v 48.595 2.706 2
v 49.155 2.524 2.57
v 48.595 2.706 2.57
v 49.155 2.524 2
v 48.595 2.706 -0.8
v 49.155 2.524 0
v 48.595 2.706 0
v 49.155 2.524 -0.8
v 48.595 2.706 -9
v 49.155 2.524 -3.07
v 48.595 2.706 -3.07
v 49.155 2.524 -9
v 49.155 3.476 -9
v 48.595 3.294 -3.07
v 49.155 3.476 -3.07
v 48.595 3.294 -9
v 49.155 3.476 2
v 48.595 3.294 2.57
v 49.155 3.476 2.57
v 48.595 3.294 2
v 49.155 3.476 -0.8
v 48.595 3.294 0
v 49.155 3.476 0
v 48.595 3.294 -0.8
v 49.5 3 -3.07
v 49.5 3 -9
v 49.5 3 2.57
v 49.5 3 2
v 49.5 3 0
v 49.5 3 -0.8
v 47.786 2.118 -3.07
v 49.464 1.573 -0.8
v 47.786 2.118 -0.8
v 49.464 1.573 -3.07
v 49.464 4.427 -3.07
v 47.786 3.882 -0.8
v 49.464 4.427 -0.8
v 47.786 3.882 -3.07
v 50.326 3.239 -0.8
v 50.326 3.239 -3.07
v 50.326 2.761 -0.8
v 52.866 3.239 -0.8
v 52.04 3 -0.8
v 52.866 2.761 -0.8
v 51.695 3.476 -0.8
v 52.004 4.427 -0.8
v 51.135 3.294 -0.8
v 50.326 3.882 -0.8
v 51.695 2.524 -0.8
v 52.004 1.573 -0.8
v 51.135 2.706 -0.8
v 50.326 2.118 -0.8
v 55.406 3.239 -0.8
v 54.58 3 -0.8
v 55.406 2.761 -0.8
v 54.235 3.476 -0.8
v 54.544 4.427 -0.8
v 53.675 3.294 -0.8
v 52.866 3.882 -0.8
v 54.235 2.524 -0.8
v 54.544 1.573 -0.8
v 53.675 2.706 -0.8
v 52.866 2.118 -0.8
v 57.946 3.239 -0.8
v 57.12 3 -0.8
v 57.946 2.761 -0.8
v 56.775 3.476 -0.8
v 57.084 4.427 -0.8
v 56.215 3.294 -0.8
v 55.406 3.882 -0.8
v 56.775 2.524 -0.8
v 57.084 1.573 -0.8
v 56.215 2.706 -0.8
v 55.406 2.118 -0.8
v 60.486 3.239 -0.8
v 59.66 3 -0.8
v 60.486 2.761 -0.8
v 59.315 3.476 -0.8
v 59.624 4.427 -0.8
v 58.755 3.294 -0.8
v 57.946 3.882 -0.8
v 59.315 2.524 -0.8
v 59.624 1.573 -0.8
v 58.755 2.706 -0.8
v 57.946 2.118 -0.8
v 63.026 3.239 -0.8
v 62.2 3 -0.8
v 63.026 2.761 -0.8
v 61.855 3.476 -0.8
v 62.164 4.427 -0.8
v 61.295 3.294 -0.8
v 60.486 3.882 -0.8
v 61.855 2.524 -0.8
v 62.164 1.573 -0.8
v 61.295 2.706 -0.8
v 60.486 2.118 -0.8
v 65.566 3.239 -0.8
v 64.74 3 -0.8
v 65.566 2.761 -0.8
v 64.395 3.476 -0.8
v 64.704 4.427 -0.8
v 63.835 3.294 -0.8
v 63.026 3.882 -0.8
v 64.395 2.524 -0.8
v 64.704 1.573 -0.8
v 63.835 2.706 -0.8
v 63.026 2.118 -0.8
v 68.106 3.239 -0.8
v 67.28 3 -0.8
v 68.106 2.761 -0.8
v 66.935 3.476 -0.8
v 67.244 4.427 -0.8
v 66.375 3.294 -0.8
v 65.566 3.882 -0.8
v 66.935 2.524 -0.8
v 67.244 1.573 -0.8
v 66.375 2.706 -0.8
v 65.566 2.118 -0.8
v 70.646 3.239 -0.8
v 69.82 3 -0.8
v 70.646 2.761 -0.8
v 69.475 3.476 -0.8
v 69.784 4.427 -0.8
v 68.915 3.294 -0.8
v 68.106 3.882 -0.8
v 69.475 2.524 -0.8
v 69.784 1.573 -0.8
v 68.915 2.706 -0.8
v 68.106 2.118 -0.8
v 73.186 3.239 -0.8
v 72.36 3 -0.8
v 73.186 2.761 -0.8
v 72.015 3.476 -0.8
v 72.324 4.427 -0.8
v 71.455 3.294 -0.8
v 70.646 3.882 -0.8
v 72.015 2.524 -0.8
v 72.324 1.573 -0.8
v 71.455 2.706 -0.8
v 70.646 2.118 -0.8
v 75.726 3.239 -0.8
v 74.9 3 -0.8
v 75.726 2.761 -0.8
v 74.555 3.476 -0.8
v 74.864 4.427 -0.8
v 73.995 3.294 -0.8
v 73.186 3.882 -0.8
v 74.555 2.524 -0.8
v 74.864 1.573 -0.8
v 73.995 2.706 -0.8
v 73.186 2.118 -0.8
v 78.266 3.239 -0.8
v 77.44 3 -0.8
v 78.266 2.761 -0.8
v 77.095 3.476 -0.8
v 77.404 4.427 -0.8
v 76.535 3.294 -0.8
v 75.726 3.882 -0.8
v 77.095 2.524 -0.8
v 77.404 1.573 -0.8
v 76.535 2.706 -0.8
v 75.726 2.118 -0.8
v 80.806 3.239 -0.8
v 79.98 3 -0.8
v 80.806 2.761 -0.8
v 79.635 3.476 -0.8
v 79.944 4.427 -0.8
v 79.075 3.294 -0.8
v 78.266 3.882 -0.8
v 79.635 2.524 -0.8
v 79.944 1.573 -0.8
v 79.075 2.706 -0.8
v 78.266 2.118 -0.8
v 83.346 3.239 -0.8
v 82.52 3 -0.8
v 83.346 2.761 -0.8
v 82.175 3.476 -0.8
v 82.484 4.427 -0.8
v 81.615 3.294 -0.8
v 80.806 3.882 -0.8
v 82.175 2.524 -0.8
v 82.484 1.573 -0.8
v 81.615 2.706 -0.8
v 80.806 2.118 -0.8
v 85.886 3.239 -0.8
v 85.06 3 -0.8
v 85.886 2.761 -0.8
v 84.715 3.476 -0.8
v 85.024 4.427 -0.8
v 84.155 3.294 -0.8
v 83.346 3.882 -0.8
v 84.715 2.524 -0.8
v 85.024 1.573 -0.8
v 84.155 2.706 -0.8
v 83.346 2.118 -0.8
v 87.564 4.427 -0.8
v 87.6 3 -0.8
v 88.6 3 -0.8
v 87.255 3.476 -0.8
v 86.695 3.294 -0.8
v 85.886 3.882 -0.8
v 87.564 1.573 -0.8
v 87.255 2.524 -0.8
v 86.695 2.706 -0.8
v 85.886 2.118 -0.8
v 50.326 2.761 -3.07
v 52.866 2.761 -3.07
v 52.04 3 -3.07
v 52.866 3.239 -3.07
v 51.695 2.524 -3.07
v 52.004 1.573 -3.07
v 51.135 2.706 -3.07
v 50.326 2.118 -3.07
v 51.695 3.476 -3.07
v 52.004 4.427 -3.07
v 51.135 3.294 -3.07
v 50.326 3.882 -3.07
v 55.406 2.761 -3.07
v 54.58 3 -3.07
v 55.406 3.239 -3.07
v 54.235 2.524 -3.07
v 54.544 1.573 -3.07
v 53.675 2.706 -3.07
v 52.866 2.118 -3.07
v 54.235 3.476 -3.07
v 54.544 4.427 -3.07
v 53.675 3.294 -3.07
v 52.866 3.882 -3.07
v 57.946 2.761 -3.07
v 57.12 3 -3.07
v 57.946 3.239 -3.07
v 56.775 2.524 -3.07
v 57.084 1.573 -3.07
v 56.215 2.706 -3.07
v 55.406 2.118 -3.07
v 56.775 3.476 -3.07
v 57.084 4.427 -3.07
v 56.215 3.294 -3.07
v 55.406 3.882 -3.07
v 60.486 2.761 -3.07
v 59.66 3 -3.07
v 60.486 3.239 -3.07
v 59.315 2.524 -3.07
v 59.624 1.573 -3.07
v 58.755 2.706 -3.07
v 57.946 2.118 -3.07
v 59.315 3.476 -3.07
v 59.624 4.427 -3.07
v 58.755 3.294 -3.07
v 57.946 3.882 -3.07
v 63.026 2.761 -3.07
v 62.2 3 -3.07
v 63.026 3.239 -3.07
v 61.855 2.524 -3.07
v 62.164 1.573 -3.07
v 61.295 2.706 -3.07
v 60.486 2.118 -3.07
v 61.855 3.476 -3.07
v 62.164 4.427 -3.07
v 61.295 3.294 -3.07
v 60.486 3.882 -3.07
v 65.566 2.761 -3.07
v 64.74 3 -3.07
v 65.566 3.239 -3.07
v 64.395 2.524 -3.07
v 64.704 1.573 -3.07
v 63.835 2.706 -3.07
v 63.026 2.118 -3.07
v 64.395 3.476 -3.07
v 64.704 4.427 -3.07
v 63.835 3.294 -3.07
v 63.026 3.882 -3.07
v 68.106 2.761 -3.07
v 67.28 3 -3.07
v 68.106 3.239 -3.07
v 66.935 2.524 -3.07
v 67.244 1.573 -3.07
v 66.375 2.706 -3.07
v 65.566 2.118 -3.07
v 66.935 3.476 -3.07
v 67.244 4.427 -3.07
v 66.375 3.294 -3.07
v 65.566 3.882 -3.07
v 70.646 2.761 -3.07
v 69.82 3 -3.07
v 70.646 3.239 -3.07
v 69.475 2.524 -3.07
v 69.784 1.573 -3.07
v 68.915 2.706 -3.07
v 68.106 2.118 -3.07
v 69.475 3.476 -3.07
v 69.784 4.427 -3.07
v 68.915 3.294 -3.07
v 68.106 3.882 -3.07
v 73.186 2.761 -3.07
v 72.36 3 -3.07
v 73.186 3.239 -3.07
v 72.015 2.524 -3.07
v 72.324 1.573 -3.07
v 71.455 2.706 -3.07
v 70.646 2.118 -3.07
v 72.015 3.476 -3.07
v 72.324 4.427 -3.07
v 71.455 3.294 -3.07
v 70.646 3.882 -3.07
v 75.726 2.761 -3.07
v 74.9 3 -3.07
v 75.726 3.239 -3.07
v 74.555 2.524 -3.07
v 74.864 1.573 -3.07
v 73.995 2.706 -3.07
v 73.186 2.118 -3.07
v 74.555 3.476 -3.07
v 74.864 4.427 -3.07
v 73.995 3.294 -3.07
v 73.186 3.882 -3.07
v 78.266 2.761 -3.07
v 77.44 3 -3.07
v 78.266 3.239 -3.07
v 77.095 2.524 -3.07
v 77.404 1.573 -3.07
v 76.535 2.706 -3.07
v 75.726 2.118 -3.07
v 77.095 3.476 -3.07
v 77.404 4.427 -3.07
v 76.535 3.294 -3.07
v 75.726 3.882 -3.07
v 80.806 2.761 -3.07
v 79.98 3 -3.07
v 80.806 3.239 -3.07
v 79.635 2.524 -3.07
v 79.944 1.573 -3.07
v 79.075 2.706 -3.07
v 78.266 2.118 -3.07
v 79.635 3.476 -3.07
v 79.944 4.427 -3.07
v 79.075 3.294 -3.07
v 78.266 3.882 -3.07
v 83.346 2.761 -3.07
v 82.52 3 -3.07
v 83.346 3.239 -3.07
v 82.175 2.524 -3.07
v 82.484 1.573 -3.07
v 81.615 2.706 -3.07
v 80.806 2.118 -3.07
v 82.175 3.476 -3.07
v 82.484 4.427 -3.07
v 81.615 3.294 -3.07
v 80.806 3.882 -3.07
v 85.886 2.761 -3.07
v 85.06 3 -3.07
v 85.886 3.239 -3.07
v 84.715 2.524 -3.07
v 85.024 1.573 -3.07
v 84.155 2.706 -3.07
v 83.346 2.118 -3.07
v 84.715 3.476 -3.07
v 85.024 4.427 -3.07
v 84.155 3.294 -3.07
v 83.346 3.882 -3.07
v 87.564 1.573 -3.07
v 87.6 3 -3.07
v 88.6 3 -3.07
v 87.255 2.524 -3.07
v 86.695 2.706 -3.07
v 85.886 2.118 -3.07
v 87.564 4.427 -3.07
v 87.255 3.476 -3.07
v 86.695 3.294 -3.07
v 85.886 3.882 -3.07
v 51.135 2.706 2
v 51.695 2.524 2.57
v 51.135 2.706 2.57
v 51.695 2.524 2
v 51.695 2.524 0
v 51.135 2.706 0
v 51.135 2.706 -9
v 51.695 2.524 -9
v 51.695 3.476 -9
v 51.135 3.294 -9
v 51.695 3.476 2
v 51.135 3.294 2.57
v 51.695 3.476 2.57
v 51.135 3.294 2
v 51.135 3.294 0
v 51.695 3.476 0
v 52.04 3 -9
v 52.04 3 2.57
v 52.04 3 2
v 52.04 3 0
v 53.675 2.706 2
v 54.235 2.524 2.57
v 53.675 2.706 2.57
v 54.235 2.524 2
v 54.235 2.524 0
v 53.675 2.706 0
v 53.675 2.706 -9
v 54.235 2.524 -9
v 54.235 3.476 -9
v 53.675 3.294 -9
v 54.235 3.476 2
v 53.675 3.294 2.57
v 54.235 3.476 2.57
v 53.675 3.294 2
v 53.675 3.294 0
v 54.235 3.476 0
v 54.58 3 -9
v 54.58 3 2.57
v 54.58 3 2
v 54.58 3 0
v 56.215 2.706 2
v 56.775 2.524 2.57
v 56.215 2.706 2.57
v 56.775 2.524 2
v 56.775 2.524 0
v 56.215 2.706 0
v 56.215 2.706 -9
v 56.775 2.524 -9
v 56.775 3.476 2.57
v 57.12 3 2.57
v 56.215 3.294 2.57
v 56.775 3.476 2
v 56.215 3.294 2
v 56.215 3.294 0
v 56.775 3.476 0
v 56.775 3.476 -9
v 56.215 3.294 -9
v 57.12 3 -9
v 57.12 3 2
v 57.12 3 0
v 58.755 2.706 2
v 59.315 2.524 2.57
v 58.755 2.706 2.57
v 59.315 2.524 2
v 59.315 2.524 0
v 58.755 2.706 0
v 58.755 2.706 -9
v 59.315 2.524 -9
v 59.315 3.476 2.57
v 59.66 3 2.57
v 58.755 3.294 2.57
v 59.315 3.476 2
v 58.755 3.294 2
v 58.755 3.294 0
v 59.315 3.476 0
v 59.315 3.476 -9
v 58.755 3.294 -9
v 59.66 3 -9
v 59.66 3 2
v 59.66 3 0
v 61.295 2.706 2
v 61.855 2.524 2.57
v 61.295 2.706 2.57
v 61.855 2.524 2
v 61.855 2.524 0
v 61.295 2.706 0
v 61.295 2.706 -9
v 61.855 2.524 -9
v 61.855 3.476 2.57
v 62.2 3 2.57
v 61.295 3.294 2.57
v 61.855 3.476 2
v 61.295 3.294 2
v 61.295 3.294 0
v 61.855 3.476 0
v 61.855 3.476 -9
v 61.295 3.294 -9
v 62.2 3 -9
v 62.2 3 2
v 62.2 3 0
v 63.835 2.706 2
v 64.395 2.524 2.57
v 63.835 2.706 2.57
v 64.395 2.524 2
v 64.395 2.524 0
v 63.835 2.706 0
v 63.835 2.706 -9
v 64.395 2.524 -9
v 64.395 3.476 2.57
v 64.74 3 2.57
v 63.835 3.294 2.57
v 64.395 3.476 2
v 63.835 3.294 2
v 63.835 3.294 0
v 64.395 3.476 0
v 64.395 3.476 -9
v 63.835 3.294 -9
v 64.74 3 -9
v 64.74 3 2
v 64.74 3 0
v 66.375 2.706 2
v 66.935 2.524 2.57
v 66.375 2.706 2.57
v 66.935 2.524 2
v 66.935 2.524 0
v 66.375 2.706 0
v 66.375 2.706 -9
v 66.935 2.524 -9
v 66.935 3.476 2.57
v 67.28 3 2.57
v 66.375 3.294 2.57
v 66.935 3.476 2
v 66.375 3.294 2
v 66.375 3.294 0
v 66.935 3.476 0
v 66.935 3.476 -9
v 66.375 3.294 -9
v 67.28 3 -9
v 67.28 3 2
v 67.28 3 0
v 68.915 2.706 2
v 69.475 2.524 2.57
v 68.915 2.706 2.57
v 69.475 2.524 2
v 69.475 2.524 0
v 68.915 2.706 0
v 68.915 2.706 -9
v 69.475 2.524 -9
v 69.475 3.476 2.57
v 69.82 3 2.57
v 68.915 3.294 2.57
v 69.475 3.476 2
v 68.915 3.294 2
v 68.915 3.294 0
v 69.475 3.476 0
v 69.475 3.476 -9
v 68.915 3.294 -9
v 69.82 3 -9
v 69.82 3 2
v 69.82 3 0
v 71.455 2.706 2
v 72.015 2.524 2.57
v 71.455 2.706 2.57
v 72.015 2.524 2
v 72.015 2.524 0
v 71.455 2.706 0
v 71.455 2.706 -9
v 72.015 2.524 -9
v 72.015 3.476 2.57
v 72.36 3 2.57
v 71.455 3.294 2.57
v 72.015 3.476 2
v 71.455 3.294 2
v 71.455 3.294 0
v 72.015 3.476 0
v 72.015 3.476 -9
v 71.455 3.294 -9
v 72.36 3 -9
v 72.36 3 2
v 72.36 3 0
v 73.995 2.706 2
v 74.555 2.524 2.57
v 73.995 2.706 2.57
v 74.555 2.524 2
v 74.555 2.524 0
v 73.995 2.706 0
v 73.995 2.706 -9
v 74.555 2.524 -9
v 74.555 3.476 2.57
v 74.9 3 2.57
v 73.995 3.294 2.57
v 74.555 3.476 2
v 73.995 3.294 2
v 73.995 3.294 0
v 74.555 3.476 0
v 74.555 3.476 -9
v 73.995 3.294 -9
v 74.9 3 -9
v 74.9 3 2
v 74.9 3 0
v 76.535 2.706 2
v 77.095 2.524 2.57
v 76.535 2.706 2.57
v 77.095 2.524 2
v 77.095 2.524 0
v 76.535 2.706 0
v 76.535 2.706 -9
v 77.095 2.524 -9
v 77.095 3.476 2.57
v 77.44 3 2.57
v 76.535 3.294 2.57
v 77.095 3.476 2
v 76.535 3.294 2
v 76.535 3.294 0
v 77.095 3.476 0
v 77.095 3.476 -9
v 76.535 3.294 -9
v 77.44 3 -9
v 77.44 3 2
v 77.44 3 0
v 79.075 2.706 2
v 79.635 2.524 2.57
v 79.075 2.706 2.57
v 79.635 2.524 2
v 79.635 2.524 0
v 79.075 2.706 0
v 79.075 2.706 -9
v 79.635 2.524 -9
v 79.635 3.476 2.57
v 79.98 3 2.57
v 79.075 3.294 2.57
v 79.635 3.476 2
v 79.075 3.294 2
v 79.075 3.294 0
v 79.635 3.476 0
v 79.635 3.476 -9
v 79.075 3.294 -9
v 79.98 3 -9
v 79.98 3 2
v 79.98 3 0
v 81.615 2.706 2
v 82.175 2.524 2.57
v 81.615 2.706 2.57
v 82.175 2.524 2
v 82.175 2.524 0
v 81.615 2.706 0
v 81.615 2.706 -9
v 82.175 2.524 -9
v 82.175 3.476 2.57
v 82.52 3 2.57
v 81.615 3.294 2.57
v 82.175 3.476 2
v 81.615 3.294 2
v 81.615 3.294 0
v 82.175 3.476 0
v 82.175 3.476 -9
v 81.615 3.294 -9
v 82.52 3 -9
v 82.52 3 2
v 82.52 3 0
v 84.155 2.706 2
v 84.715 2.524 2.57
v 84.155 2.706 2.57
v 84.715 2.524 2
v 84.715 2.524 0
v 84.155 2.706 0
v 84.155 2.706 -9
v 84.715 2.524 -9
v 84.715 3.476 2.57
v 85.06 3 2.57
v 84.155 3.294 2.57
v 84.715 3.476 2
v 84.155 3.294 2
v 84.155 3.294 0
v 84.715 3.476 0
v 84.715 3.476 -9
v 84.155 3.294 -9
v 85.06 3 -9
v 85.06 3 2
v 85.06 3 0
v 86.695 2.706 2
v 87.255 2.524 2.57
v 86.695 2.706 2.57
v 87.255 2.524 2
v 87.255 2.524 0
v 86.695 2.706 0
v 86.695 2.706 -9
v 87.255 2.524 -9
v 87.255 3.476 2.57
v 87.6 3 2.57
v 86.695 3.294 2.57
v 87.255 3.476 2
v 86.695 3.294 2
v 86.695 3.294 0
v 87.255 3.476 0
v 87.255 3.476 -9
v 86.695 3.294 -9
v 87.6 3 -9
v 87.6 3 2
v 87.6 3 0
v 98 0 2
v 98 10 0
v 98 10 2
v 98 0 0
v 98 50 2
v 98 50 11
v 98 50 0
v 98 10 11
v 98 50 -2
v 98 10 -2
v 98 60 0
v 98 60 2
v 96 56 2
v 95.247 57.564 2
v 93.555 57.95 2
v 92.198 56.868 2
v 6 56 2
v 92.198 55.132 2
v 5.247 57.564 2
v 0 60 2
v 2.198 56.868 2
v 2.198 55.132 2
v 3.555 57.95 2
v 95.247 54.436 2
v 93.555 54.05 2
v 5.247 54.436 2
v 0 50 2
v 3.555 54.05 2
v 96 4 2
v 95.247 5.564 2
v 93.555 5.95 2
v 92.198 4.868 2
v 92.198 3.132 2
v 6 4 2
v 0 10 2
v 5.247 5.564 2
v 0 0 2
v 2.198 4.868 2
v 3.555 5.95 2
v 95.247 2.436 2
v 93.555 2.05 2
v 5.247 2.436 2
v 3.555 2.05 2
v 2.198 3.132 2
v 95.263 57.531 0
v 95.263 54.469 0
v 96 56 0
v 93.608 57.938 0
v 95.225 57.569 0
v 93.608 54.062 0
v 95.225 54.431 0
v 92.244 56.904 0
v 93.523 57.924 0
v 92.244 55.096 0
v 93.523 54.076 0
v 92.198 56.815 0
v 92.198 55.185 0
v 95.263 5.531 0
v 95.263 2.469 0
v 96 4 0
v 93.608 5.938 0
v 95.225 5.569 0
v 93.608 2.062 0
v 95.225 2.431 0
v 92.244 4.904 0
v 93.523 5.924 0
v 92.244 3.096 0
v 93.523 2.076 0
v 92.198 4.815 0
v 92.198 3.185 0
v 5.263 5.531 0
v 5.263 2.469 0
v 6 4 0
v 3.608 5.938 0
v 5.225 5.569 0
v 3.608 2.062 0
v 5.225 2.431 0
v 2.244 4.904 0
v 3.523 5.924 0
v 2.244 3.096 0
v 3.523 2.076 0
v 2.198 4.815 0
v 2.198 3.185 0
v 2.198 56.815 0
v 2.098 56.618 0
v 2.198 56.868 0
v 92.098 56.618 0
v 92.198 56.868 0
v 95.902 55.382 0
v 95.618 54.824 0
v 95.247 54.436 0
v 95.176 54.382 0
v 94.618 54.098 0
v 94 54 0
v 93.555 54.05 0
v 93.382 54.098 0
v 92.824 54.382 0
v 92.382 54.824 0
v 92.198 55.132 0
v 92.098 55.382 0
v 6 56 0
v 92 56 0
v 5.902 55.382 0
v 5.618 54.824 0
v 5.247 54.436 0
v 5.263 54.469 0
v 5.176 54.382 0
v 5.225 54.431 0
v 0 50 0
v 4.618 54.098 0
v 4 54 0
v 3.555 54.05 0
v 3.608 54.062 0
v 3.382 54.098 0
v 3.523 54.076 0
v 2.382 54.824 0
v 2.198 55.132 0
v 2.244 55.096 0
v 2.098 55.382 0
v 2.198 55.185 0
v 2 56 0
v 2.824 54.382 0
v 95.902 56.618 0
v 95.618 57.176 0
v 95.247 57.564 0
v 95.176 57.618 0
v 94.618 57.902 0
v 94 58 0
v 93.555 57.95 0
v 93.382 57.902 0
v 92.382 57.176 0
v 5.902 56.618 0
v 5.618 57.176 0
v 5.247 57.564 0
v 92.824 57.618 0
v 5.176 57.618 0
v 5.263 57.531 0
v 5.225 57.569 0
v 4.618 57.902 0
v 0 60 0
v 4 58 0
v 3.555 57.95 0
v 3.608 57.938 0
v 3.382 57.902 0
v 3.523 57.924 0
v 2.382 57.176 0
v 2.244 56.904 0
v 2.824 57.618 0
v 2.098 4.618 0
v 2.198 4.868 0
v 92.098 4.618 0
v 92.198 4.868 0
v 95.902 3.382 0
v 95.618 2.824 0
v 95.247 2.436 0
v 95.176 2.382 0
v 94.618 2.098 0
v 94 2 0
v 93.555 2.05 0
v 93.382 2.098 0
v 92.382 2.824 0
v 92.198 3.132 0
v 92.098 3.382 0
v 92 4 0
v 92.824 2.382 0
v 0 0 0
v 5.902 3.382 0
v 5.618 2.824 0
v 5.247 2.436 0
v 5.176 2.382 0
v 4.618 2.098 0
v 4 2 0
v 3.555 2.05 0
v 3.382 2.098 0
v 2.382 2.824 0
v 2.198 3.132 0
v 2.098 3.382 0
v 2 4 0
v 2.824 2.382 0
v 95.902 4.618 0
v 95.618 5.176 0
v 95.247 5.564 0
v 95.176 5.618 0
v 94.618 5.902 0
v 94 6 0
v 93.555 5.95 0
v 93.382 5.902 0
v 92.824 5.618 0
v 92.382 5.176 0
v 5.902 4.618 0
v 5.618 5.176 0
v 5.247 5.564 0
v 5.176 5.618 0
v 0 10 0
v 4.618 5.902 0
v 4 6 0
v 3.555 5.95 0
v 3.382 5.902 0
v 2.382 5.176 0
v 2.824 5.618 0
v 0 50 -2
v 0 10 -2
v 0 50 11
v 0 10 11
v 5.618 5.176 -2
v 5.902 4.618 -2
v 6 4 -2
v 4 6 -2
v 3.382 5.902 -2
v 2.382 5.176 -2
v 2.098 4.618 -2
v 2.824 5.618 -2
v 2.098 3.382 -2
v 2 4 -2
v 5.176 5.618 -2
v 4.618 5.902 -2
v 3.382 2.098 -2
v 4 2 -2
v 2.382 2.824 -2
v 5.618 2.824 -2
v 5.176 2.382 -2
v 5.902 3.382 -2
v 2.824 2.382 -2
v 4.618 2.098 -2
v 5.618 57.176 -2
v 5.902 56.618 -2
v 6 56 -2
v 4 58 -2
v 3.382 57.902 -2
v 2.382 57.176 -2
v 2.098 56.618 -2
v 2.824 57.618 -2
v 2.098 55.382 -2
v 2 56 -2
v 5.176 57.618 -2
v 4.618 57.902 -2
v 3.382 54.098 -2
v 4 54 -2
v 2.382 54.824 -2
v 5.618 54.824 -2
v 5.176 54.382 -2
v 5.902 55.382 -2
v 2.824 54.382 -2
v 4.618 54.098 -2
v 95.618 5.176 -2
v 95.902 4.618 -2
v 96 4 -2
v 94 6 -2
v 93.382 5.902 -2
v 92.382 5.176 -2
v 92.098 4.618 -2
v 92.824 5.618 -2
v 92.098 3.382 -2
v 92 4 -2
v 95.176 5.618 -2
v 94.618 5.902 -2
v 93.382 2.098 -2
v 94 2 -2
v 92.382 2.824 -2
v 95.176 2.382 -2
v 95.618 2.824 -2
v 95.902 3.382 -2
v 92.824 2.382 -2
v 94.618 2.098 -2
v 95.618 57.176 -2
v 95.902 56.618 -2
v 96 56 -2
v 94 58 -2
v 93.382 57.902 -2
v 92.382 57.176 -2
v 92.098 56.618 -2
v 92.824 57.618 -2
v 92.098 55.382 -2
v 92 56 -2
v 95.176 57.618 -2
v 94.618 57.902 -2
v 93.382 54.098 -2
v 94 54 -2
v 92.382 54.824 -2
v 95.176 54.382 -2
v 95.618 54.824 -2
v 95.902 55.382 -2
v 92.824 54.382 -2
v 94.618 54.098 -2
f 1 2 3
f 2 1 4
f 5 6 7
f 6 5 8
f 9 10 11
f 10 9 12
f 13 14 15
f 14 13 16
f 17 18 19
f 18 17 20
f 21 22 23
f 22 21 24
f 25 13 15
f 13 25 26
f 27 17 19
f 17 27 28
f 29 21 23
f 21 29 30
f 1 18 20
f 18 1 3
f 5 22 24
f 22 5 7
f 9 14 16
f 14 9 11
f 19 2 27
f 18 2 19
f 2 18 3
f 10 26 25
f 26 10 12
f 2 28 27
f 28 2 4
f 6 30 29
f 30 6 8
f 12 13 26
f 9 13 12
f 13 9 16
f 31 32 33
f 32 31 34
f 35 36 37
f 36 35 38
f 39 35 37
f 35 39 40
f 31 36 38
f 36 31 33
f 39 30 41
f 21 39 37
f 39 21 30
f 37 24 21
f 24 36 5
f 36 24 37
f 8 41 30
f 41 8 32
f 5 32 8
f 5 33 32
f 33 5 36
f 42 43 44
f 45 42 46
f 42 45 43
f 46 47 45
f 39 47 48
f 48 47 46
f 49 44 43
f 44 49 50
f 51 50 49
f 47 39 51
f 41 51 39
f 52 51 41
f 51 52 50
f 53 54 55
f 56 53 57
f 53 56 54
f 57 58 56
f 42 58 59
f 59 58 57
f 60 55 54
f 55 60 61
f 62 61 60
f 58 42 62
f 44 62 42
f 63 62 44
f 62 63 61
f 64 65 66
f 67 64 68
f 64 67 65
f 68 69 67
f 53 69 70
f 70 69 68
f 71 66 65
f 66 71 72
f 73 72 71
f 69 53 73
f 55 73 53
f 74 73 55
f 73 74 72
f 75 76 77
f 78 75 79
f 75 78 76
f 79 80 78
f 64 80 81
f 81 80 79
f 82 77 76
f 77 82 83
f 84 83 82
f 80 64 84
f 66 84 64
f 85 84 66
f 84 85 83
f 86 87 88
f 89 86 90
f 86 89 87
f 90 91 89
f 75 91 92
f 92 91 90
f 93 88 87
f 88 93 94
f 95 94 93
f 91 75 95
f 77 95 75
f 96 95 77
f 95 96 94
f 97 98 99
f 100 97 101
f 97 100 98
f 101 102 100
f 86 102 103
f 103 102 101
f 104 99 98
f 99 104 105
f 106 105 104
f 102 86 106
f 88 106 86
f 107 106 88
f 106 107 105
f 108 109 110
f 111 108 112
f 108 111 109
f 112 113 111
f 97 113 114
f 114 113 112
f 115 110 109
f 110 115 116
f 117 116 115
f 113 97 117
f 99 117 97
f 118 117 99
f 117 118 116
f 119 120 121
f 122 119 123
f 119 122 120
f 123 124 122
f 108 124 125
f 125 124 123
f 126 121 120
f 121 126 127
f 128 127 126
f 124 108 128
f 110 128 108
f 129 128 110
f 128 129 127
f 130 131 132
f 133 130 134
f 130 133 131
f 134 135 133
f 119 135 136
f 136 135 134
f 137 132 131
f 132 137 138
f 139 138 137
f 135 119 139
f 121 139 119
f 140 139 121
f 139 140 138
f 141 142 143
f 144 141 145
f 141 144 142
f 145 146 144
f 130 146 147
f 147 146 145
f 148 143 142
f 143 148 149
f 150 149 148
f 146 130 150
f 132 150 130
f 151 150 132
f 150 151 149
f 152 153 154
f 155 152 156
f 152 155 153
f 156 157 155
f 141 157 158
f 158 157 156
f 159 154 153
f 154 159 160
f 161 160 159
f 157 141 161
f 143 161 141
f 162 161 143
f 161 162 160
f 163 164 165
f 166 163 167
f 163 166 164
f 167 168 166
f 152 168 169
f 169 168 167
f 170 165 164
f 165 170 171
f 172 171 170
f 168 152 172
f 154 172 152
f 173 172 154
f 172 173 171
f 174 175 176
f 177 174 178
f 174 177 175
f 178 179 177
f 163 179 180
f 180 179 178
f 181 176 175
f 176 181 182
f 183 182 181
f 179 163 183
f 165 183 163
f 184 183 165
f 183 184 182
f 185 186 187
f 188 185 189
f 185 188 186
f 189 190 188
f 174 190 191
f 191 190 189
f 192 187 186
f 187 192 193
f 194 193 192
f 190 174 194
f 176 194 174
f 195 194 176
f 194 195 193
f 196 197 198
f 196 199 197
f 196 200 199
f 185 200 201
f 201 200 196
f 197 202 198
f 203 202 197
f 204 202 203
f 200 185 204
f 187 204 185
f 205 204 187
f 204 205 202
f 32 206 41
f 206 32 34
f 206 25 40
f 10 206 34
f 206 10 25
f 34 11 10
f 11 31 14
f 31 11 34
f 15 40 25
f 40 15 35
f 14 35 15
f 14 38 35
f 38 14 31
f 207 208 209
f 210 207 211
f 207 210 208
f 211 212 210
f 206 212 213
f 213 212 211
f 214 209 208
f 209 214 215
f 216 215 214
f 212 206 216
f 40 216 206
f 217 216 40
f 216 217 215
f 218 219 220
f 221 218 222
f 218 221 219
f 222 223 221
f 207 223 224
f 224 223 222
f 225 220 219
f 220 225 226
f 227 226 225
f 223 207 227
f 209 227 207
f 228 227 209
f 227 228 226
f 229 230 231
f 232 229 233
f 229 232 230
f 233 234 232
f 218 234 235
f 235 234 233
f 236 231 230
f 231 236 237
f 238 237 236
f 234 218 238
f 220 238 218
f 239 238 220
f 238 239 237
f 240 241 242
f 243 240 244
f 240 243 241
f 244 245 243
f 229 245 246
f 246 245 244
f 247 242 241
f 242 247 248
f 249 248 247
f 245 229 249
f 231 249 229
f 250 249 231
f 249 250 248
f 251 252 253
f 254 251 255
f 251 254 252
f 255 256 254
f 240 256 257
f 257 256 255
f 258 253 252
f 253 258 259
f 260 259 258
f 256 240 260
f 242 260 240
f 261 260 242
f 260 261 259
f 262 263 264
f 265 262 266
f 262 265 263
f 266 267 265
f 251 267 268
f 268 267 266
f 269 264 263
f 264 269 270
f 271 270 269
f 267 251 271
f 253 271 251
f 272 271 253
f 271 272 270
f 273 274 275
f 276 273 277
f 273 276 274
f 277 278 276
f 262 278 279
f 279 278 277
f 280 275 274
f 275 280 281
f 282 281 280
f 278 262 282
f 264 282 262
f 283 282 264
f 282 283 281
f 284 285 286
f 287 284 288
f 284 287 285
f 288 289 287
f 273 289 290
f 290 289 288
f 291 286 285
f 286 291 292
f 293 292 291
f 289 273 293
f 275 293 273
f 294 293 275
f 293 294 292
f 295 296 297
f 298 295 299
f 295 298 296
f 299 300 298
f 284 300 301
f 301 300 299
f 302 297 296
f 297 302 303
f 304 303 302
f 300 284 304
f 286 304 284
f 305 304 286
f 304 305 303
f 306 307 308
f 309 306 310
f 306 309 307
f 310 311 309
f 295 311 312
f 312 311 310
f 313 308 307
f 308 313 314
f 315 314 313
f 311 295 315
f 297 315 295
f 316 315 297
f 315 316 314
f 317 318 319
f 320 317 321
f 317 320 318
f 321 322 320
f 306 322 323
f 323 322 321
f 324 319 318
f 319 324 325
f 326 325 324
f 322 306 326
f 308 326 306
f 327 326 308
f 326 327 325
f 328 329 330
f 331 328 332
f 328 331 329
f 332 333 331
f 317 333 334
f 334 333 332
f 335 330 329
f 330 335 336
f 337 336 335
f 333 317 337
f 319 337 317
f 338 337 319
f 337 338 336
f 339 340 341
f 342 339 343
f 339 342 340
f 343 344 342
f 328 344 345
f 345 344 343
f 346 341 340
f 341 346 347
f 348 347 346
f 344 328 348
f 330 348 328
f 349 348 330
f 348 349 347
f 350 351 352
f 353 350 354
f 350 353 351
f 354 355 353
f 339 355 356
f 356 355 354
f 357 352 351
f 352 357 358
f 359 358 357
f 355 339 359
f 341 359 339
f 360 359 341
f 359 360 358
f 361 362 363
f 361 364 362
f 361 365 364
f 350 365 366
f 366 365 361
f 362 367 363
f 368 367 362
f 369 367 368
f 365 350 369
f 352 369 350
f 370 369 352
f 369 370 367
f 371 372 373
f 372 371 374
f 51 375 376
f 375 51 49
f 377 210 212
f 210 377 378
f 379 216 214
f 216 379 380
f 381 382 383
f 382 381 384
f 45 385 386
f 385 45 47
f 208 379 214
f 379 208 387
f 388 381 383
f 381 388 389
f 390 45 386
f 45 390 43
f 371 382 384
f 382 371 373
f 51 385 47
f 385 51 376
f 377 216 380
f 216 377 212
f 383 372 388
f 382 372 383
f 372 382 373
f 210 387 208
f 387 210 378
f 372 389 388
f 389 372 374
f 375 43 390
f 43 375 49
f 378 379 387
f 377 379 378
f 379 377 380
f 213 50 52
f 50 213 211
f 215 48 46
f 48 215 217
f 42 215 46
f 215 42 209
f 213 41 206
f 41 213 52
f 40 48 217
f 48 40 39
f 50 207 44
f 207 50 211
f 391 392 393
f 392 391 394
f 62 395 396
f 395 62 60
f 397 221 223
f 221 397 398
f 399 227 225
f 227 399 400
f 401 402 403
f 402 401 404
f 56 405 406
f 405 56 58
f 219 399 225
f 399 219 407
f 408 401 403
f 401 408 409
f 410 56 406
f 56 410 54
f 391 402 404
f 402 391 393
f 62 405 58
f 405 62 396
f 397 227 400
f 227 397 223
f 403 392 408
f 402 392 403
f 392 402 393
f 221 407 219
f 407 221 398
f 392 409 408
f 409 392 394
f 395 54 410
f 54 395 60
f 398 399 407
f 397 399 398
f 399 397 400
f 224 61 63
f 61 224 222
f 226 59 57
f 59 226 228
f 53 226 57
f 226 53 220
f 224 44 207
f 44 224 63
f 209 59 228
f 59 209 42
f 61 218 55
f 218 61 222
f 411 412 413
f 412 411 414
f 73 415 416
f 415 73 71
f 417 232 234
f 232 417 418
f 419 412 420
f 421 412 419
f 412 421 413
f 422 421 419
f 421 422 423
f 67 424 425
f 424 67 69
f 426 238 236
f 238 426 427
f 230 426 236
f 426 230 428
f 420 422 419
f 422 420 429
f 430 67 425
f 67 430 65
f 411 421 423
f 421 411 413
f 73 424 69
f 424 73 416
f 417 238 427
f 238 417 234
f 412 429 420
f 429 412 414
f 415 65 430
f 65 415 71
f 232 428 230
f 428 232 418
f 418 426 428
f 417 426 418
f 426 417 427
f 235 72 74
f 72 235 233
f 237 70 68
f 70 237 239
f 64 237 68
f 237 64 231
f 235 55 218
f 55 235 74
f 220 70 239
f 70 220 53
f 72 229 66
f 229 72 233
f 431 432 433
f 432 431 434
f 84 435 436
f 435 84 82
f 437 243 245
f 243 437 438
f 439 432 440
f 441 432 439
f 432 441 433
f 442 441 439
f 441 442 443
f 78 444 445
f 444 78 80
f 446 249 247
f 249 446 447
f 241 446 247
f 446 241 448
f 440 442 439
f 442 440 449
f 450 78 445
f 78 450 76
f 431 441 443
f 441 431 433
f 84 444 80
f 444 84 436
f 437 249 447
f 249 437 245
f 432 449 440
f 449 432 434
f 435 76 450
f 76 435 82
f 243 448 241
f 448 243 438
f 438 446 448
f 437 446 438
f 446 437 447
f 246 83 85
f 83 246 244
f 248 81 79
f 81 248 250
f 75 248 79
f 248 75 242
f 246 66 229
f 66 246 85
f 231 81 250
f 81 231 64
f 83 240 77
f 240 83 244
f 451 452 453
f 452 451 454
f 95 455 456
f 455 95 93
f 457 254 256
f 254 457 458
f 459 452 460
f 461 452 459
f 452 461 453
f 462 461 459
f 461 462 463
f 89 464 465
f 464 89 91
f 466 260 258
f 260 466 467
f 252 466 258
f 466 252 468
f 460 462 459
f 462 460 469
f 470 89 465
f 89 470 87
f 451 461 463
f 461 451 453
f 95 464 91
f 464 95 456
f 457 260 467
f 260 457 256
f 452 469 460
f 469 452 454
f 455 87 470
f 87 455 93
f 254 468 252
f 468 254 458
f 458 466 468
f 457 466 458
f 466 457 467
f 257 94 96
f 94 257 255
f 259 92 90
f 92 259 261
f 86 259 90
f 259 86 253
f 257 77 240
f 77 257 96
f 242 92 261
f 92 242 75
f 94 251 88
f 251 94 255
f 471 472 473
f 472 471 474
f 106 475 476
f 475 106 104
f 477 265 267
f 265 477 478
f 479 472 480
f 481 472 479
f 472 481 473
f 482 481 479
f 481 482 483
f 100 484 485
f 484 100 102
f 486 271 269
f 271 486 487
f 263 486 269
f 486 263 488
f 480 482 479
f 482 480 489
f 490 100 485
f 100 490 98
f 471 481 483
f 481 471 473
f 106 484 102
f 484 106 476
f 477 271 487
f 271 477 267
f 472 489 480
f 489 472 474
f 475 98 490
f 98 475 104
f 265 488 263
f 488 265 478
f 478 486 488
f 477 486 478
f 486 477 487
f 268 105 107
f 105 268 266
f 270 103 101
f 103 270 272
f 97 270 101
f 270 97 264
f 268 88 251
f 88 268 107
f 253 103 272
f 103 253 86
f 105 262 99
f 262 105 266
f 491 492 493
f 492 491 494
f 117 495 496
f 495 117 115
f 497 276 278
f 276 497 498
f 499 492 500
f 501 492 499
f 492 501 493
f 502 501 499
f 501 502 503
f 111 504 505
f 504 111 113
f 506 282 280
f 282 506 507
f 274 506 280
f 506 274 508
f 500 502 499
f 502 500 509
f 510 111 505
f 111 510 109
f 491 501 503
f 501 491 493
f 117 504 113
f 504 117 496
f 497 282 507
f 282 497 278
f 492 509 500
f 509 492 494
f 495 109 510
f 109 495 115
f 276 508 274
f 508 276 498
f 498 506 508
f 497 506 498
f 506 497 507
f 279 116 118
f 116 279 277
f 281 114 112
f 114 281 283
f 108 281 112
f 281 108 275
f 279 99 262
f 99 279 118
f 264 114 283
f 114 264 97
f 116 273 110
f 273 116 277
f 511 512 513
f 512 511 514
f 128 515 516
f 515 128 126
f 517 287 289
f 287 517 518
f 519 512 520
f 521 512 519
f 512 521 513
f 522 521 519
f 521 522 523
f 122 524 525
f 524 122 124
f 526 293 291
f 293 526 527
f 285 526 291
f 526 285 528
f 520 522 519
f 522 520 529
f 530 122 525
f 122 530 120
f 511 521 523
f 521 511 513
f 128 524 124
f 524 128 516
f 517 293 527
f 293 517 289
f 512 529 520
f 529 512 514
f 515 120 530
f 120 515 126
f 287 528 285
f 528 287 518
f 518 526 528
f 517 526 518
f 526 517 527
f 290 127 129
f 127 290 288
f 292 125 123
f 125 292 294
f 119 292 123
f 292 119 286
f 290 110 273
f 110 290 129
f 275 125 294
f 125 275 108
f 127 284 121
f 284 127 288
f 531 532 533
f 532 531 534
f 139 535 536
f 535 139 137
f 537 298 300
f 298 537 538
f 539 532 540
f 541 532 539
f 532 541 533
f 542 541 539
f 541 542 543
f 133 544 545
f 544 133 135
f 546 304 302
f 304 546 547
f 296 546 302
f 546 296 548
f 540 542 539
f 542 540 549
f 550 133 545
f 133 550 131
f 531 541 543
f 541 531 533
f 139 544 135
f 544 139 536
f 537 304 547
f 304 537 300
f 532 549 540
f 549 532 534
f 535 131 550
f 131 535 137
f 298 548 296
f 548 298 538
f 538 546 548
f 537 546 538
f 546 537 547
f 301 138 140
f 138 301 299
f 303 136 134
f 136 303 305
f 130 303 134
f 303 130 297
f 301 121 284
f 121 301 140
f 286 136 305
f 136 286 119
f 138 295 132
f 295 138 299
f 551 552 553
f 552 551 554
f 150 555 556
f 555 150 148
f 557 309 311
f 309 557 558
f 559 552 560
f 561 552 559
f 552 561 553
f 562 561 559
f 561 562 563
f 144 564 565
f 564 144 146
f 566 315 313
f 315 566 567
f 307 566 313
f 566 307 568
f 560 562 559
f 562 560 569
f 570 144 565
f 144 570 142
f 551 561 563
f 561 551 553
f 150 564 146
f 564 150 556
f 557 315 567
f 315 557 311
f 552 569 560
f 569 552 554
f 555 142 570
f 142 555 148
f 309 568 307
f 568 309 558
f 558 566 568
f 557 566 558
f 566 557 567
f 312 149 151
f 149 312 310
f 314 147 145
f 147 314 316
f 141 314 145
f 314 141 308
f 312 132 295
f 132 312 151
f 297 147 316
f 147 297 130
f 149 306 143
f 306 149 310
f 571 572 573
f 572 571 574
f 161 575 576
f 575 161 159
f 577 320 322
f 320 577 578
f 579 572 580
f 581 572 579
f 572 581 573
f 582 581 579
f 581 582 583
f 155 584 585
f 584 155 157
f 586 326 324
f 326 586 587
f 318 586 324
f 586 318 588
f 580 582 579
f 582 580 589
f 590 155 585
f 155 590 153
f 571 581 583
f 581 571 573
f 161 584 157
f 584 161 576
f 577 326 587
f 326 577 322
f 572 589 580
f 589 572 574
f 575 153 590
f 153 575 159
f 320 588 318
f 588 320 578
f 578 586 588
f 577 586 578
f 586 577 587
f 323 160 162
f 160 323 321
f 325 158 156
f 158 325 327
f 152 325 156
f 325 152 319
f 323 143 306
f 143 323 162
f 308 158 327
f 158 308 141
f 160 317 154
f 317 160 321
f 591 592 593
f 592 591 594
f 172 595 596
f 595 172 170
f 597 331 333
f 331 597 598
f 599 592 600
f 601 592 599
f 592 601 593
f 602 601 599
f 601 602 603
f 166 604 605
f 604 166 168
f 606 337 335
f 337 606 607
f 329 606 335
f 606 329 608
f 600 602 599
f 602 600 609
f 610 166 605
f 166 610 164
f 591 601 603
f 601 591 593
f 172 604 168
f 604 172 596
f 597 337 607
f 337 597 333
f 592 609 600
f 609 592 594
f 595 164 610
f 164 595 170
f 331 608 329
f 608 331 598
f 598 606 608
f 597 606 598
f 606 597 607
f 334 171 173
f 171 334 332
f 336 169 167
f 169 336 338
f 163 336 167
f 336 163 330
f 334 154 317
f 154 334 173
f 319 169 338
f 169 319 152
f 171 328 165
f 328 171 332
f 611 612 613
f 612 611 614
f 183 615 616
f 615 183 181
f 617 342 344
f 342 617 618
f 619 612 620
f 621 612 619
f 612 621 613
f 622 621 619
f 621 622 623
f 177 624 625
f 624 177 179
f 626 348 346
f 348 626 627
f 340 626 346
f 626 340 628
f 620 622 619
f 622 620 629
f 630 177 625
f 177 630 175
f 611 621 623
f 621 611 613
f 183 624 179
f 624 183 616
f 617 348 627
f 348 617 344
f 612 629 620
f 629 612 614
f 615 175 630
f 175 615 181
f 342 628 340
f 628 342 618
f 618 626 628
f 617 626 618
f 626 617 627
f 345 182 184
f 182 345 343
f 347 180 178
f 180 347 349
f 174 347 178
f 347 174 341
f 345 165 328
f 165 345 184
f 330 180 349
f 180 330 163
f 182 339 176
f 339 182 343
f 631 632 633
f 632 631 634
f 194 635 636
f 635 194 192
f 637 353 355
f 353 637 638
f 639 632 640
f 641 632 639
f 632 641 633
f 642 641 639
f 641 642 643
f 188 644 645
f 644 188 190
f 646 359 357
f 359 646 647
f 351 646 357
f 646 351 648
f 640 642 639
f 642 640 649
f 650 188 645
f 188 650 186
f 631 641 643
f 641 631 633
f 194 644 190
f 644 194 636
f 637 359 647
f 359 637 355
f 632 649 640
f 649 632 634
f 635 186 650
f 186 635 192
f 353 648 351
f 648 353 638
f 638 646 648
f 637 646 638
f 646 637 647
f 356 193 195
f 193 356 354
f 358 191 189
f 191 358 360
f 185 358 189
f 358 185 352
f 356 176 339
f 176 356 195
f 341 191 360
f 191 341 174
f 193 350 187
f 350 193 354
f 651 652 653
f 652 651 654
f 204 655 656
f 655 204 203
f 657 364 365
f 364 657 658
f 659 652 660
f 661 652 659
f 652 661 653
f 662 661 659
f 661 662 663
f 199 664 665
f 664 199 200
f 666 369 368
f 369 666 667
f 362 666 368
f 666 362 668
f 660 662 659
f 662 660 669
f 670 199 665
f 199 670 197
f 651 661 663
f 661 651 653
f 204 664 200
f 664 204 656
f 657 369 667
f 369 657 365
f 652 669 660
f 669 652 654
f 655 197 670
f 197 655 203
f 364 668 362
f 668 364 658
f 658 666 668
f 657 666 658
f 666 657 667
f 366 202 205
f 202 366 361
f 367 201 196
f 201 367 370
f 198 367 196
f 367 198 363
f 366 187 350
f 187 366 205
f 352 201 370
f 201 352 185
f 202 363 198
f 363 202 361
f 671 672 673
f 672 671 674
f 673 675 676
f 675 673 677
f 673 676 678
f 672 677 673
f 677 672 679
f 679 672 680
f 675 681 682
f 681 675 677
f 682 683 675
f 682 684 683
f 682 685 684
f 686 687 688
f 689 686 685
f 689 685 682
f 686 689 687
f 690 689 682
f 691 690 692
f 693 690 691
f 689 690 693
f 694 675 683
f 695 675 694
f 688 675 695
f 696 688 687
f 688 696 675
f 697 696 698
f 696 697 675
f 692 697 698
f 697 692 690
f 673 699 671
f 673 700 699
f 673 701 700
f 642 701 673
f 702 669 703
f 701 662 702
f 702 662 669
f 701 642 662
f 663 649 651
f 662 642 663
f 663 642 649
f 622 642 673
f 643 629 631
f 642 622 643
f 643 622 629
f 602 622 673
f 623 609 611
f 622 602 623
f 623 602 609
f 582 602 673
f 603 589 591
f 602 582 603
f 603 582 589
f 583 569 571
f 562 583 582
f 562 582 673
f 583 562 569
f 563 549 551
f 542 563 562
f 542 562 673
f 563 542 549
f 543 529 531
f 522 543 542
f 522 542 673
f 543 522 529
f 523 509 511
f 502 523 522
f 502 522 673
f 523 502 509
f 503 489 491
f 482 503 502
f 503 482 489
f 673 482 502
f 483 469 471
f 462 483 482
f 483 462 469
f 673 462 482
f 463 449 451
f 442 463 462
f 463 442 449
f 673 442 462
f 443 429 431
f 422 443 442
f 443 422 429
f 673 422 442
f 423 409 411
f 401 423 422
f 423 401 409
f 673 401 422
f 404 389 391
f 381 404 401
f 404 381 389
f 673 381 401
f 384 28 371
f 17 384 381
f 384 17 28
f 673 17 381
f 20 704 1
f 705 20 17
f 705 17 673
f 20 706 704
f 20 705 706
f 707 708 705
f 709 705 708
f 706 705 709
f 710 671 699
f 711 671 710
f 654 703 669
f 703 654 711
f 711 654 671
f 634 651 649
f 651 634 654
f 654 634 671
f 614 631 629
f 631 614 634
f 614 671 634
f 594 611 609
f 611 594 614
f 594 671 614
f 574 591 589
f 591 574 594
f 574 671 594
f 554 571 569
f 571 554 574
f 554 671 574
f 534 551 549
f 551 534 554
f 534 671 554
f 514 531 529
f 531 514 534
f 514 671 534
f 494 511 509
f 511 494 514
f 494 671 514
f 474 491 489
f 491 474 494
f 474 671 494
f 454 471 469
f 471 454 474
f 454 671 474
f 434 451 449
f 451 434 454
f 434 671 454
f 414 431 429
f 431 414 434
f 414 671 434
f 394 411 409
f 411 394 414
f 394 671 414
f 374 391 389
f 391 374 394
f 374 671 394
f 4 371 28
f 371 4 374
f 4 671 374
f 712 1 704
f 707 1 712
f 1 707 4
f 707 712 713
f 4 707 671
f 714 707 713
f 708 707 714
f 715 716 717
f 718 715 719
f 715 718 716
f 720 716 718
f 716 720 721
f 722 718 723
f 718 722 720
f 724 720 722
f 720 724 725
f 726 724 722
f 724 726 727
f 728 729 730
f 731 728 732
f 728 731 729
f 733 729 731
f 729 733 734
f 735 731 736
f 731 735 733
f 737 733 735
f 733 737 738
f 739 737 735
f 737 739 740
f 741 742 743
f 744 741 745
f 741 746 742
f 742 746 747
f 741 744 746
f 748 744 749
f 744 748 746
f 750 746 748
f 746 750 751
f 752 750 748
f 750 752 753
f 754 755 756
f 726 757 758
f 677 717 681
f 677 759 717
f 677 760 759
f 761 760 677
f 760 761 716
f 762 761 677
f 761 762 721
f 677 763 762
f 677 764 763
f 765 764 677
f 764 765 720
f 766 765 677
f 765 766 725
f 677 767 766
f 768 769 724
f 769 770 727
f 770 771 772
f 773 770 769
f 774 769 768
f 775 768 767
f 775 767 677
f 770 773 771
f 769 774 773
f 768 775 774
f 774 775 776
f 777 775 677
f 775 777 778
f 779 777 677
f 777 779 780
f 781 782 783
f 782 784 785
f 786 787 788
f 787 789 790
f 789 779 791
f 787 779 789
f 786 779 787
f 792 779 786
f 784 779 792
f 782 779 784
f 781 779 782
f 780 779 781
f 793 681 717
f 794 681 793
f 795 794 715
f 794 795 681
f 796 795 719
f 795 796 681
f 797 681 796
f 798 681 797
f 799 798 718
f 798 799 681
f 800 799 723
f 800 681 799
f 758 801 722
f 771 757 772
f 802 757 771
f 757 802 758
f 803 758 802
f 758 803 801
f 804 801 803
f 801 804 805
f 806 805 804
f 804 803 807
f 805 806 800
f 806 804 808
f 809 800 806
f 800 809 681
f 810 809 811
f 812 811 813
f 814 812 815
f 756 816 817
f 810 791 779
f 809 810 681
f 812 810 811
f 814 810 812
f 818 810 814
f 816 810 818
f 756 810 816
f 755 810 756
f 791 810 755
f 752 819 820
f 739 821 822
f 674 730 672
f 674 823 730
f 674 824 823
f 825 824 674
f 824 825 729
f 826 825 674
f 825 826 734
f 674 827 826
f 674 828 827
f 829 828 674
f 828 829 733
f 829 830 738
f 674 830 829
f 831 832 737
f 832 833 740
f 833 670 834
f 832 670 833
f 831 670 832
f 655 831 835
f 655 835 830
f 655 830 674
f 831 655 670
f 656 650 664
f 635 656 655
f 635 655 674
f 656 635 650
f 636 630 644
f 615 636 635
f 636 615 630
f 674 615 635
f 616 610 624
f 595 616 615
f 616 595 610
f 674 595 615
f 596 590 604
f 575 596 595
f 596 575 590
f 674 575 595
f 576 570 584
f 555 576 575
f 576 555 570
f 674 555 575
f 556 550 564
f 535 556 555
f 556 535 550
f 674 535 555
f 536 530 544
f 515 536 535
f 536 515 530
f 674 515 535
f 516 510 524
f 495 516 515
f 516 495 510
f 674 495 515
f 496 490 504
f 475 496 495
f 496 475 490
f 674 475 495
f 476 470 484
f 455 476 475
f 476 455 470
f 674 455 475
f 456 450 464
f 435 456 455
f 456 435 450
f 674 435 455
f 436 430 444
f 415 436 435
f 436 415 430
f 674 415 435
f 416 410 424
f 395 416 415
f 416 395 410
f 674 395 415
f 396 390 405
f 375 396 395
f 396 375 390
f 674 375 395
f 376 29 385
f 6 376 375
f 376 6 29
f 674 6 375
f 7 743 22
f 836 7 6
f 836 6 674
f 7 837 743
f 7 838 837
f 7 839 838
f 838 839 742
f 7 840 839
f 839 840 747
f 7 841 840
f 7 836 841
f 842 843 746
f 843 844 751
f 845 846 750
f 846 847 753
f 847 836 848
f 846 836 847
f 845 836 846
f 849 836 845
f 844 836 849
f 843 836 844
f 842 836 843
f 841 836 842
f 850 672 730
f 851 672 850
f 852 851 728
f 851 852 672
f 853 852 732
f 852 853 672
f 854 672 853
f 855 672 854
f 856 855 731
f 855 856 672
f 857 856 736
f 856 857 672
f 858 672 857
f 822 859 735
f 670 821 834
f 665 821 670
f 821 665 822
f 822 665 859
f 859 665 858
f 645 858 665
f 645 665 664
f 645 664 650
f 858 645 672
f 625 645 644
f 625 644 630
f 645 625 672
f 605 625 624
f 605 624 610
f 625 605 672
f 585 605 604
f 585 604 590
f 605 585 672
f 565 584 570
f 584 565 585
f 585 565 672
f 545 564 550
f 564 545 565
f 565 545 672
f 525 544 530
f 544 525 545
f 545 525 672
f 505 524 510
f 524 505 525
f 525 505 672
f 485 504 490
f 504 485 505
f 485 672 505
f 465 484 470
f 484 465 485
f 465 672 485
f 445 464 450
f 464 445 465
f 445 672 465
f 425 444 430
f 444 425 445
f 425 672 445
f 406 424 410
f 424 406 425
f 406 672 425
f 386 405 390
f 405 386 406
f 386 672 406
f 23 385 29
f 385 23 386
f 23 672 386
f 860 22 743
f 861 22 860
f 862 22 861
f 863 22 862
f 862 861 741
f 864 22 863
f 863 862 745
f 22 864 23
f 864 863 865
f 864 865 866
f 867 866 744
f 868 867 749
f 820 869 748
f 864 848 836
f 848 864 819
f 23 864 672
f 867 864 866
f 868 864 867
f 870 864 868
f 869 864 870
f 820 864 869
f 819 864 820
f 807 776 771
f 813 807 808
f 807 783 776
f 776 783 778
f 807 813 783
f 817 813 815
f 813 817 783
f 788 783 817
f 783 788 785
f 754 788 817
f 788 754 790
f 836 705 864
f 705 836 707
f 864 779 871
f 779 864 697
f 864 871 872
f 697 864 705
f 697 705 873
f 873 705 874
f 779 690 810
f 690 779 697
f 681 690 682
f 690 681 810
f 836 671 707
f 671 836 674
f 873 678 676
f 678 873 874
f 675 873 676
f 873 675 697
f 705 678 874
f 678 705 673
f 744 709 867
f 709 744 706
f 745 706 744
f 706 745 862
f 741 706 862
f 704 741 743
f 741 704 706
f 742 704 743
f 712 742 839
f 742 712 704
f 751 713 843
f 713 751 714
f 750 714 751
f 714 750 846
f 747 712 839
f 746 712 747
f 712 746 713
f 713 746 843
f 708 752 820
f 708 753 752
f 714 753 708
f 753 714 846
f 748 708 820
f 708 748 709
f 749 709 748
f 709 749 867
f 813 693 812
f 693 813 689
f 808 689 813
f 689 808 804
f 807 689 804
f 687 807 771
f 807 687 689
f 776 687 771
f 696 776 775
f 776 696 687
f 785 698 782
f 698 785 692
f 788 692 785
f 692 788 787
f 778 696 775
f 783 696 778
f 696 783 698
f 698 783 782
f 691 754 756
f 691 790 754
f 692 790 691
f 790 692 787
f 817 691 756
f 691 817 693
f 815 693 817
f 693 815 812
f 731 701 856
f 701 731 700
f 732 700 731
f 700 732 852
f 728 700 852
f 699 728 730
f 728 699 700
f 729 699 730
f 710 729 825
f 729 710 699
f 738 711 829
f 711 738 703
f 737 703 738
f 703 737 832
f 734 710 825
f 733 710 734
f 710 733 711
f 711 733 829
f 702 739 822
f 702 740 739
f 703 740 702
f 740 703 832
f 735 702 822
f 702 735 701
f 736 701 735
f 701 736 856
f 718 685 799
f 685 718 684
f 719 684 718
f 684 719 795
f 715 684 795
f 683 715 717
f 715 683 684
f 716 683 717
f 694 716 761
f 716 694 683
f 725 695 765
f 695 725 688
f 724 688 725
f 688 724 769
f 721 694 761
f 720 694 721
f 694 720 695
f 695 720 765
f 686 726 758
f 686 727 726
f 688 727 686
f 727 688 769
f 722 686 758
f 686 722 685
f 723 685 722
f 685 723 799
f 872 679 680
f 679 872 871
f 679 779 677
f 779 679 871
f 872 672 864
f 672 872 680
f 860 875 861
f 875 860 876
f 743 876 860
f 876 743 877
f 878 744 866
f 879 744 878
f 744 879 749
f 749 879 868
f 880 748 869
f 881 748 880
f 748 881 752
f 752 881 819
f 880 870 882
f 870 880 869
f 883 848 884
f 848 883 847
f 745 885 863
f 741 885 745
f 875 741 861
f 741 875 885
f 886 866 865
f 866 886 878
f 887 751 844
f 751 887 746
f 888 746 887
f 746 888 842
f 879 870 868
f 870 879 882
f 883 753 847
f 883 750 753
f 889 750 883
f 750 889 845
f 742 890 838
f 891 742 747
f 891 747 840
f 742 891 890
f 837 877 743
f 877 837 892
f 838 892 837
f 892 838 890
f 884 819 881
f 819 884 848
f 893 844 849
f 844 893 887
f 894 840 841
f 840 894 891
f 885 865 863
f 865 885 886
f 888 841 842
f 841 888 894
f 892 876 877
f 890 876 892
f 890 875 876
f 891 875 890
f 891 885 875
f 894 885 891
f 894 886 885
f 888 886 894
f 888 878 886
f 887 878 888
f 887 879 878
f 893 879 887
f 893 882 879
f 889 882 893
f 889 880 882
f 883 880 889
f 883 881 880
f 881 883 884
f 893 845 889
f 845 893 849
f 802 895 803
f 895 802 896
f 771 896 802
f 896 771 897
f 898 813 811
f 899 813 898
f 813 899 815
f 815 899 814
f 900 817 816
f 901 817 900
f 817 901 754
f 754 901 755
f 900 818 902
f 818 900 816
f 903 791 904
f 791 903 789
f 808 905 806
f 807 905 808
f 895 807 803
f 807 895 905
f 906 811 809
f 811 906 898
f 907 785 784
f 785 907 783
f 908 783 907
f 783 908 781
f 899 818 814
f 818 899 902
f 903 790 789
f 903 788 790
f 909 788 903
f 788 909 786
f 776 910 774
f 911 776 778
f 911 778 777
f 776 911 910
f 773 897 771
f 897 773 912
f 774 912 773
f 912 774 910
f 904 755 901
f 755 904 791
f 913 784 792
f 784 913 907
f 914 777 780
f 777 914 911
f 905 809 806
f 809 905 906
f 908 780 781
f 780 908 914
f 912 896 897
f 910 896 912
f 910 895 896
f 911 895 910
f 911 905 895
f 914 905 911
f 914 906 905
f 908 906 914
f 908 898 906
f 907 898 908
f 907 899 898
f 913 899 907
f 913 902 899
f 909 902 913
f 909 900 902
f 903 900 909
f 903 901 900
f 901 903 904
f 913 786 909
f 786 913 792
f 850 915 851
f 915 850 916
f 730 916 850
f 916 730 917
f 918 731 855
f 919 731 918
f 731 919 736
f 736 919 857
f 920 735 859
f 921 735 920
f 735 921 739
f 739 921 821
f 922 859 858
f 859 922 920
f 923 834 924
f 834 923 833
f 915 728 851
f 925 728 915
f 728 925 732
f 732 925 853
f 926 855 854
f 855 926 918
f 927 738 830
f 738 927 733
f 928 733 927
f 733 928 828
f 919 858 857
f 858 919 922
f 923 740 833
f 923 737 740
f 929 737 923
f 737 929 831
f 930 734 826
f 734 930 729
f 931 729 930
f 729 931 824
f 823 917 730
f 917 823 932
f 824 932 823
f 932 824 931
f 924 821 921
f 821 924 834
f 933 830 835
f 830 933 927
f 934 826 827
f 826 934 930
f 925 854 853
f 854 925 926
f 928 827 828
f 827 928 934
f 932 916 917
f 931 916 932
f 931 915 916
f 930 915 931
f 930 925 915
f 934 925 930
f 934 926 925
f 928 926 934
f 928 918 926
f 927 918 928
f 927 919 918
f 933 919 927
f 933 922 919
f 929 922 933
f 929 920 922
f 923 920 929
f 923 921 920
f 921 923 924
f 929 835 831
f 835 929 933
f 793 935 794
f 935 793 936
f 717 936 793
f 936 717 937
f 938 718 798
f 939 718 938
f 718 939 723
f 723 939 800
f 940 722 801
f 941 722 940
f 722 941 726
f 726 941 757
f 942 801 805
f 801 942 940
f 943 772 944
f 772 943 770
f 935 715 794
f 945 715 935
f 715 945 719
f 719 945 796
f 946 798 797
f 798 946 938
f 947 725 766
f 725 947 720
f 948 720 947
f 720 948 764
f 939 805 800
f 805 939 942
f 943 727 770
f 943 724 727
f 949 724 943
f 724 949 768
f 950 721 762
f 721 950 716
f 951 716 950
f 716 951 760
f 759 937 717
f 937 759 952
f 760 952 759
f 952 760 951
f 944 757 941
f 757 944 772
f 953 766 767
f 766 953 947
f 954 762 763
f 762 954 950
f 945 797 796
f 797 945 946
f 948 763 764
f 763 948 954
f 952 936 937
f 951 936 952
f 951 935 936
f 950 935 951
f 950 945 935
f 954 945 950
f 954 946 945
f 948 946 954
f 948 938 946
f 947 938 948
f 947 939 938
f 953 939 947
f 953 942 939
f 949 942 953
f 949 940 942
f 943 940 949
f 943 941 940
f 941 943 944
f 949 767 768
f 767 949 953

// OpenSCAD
// file: bbs_pins.scad
//
// A pin header with 0.1 inch spacing
//
pitch = 2.54;

module bbs_header(pins)
{
    for (i = [1 : pins])
    {
        translate([(i-1)*pitch, 0, -9]) cylinder(h=11.57, r=0.5);
        translate([(i-1)*pitch, 0, -9 + 5.93]) cylinder(h=2.27, r=1.5);
    }
}

bbs_header(10);
// main file
use <bbs_pins.scad>
//
// Model for a 20x4 LCD
// AdaFruit item #198
//
module bbs_20x4_lcd()
{
  difference()
  {
    union()
    {
      cube([98, 60, 2], center=false);
      translate([0, 10, 0]) cube([98, 40, 11]);
      translate([49, 3, ]) bbs_header(16);;
    }
    union()
    {
      translate([4, 4, -1]) cylinder(h=4, r=2);
      translate([4, 56, -1]) cylinder(h=4, r=2);
      translate([94, 4, -1]) cylinder(h=4, r=2);
      translate([94, 56, -1]) cylinder(h=4, r=2);
    }
  }
}

module bbs_20x4_lcd_cutouts(height, facets)
{
    union()
    {
      translate([0, 10, 0]) cube([98, 40, height]);
      translate([4, 4, 0]) cylinder(h=height, r=2, $fn=facets);
      translate([4, 56, 0]) cylinder(h=height, r=2, $fn=facets);
      translate([94, 4, 0]) cylinder(h=height, r=2, $fn=facets);
      translate([94, 56, 0]) cylinder(h=height, r=2, $fn=facets);
    }
}

bbs_20x4_lcd();
translate([0, 0, -2]) color("red") bbs_20x4_lcd_cutouts(2, 20);
